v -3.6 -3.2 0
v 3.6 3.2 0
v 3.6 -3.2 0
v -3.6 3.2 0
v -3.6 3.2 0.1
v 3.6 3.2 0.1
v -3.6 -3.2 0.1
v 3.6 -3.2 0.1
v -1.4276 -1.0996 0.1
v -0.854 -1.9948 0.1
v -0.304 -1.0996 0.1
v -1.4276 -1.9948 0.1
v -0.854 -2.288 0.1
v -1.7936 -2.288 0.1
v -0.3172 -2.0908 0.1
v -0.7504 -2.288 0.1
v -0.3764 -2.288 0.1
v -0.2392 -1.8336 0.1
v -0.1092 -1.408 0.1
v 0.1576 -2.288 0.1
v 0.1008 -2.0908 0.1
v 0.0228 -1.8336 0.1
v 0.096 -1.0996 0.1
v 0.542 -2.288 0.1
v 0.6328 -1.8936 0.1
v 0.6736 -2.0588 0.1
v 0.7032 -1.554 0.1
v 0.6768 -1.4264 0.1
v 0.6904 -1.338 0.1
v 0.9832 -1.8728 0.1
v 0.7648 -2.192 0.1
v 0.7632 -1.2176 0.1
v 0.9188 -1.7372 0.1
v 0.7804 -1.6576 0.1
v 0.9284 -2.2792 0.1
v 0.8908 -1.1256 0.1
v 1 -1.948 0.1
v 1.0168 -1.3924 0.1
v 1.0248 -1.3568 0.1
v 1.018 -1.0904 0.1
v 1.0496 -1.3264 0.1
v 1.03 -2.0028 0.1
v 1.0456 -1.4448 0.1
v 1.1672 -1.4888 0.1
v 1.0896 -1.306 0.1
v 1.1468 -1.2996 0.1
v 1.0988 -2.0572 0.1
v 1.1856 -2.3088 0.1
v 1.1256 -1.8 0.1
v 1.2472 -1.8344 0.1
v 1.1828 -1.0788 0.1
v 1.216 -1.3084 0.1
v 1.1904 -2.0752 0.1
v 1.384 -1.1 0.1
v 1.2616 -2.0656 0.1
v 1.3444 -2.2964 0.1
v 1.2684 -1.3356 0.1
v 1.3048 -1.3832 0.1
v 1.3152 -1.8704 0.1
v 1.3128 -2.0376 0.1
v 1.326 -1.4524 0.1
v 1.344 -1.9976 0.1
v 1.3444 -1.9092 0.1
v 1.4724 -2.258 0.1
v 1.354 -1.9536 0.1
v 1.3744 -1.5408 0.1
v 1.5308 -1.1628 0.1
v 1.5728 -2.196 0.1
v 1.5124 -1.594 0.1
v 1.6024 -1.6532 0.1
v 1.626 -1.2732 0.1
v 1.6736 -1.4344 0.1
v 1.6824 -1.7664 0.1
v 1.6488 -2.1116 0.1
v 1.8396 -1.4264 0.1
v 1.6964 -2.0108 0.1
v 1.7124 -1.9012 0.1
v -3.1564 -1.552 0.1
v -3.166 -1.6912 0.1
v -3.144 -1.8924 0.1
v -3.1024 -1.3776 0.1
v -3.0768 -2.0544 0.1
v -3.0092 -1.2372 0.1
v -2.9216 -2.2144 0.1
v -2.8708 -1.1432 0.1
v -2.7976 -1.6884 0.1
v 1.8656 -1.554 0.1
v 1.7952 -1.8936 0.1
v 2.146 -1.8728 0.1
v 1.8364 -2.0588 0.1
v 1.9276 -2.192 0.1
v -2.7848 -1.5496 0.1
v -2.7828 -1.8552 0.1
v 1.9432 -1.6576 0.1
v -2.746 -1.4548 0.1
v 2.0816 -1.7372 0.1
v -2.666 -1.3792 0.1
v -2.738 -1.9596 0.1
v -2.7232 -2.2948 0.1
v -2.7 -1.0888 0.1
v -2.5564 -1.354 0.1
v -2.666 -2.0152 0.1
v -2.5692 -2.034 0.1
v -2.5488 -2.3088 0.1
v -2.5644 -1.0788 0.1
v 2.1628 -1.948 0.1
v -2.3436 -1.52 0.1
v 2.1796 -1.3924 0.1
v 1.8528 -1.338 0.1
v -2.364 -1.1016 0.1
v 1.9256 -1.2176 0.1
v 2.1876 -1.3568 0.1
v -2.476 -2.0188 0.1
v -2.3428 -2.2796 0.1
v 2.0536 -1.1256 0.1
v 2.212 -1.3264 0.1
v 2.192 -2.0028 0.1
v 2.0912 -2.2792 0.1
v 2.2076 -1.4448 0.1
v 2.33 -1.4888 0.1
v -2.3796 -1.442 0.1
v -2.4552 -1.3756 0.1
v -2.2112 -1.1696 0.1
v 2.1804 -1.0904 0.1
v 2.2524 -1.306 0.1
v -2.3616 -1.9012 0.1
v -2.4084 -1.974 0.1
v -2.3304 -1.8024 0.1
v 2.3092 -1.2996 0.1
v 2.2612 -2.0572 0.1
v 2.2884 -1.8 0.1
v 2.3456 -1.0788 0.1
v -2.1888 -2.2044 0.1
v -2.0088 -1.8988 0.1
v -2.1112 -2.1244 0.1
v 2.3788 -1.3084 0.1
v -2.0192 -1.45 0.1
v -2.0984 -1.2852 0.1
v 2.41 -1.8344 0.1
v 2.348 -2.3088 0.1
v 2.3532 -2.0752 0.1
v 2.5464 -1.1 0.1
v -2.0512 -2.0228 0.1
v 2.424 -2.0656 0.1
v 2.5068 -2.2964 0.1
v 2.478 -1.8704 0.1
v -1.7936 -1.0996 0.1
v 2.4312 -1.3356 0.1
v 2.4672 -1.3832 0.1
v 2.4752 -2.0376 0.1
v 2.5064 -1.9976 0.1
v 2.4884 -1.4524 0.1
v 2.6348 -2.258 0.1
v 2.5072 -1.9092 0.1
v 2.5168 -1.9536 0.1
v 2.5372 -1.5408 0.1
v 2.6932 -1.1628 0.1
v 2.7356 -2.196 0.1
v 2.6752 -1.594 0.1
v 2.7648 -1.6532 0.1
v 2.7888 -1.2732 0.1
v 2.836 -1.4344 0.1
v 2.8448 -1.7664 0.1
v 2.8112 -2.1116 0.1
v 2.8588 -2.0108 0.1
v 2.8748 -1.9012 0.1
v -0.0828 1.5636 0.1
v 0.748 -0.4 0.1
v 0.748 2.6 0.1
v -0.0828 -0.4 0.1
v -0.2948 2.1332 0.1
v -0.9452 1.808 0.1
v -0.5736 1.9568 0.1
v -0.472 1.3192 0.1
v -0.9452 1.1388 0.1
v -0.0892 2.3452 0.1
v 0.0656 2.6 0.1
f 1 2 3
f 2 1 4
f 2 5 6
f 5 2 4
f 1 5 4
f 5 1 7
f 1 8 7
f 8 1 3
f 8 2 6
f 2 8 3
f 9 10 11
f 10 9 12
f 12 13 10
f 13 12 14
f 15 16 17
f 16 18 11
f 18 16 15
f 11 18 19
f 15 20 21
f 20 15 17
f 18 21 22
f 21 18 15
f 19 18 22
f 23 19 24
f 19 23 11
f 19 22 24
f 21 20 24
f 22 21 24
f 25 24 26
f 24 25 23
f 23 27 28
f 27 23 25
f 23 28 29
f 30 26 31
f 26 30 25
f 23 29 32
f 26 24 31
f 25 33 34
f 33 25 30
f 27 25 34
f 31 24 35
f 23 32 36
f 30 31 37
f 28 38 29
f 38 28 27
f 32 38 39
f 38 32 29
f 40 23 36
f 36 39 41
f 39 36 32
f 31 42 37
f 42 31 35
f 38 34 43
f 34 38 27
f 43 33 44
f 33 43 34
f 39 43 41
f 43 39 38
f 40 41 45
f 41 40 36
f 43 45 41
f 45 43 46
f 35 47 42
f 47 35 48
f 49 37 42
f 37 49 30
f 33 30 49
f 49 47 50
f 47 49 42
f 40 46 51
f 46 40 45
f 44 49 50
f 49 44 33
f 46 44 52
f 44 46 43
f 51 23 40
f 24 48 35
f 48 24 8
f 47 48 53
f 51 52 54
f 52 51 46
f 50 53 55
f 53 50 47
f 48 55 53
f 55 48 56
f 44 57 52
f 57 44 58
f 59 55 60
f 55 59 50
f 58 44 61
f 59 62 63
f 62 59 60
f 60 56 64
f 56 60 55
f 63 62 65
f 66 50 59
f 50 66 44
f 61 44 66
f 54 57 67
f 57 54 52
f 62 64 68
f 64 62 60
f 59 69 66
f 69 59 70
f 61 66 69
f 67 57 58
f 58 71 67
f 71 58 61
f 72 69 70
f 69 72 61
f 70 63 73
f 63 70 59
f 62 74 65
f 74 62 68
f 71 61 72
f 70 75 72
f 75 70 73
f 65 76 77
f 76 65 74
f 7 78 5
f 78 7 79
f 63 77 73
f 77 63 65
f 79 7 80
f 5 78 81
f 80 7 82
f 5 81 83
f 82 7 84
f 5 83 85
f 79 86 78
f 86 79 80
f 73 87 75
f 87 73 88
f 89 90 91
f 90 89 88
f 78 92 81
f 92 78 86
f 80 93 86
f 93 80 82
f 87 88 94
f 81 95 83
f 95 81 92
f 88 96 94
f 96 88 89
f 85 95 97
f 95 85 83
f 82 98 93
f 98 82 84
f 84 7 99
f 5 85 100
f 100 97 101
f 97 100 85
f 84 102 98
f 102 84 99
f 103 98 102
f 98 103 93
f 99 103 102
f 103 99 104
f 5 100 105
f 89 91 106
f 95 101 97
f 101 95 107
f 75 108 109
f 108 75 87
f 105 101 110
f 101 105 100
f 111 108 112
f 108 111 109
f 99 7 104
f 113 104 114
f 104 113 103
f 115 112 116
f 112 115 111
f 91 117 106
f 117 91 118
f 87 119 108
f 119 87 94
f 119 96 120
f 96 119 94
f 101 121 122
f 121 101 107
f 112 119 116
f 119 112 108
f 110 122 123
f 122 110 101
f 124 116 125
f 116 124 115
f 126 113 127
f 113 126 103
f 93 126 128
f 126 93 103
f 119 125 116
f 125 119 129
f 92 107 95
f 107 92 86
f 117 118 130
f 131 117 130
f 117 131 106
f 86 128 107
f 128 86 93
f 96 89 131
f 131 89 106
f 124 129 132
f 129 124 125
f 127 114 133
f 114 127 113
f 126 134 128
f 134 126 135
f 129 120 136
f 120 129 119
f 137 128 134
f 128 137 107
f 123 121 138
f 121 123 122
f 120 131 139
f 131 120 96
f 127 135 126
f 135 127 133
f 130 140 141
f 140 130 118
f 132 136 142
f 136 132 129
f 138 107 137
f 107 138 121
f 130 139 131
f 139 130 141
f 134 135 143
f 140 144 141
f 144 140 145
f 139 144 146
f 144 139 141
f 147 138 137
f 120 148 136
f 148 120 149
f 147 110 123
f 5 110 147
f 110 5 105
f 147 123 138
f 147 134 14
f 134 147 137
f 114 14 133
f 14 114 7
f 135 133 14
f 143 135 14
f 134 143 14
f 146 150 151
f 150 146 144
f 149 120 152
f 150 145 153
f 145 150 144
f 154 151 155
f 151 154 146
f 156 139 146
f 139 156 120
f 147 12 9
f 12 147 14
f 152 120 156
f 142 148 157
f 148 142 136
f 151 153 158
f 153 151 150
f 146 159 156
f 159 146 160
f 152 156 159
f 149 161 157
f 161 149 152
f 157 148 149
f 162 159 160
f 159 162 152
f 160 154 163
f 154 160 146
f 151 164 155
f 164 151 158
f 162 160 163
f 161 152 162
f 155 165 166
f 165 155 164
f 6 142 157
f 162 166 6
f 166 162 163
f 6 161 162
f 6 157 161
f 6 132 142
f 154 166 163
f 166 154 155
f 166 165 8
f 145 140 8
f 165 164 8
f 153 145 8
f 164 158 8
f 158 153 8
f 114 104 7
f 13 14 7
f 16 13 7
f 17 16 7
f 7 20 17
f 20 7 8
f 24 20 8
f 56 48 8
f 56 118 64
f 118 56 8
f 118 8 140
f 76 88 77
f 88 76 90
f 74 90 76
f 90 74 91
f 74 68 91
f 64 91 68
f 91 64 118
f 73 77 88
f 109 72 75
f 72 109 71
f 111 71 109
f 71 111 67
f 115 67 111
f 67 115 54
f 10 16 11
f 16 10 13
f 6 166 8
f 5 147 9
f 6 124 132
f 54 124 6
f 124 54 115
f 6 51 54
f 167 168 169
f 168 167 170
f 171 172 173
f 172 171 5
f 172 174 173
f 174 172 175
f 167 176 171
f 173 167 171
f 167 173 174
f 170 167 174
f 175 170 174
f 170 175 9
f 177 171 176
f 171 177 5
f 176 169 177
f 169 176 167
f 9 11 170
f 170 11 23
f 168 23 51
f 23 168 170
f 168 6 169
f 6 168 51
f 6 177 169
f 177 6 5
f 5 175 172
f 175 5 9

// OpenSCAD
// file: ../p/box5-12.scad
use <../lib.scad>
function ldraw_lib__box5_12() = [
// 0 Box with 5 Faces without Any Edges
// 0 Name: box5-12.dat
// 0 Author: Chris Dee [cwdee]
// 0 !LDRAW_ORG Primitive UPDATE 2009-02
// 0 !LICENSE Licensed under CC BY 4.0 : see CAreadme.txt
// 
// 0 BFC CERTIFY CCW
  [0,"BFC","CERTIFY"],
  [0,"BFC","CCW"],
// 
// 0 !HISTORY 2009-09-03 [PTadmin] Official Update 2009-02
// 
// 
// 4 16 1 1 1 1 1 -1 -1 1 -1 -1 1 1
  [4,16,1,1,1,1,1,-1,-1,1,-1,-1,1,1],
// 4 16 -1 0 1 1 0 1 1 1 1 -1 1 1
  [4,16,-1,0,1,1,0,1,1,1,1,-1,1,1],
// 4 16 -1 0 -1 -1 0 1 -1 1 1 -1 1 -1
  [4,16,-1,0,-1,-1,0,1,-1,1,1,-1,1,-1],
// 4 16 1 0 -1 -1 0 -1 -1 1 -1 1 1 -1
  [4,16,1,0,-1,-1,0,-1,-1,1,-1,1,1,-1],
// 4 16 1 0 1 1 0 -1 1 1 -1 1 1 1
  [4,16,1,0,1,1,0,-1,1,1,-1,1,1,1],
// 0
];
module ldraw_lib__box5_12(step=0, col=false, unit=2/5, alt=false, line=0.2, solid=!$preview)
    makepoly(ldraw_lib__box5_12(), step=step, col=col, unit=unit, alt=alt, line=line, solid=solid);
ldraw_lib__box5_12(line=0.2);
// main file
use <../lib.scad>
use <s/4296207gs01.scad>
function ldraw_lib__4296207g() = [
// 0 Sticker 0.8 x  0.9 with White "1 CLASS"
// 0 Name: 4296207g.dat
// 0 Author: Gerald Lasser [GeraldLasser]
// 0 !LDRAW_ORG Part UPDATE 2024-03
// 0 !LICENSE Licensed under CC BY 4.0 : see CAreadme.txt
// 
// 0 BFC CERTIFY CCW
  [0,"BFC","CERTIFY"],
  [0,"BFC","CCW"],
// 
// 0 !KEYWORDS Font Impact, Set 7897
// 
// 0 !HISTORY 2024-04-28 [OrionP] Official Update 2024-03
// 
// 
// 1 16 0 0 0 1 0 0 0 1 0 0 0 1 s\4296207gs01.dat
  [1,16,0,0,0,1,0,0,0,1,0,0,0,1, ldraw_lib__s__4296207gs01()],
// 
// 4 15 -.207 -.25 3.909 -.207 -.25 -1 1.87 -.25 -1 1.87 -.25 6.5
  [4,15,-.207,-.25,3.909,-.207,-.25,-1,1.87,-.25,-1,1.87,-.25,6.5],
// 4 16 -.737 -.25 5.333 -9 -.25 8 -2.363 -.25 4.52 -1.434 -.25 4.892
  [4,16,-.737,-.25,5.333,-9,-.25,8,-2.363,-.25,4.52,-1.434,-.25,4.892],
// 4 15 -1.434 -.25 4.892 -2.363 -.25 4.52 -2.363 -.25 2.847 -1.18 -.25 3.298
  [4,15,-1.434,-.25,4.892,-2.363,-.25,4.52,-2.363,-.25,2.847,-1.18,-.25,3.298],
// 3 15 -.207 -.25 3.909 -.223 -.25 5.863 -.737 -.25 5.333
  [3,15,-.207,-.25,3.909,-.223,-.25,5.863,-.737,-.25,5.333],
// 4 15 -1.18 -.25 3.298 -.207 -.25 3.909 -.737 -.25 5.333 -1.434 -.25 4.892
  [4,15,-1.18,-.25,3.298,-.207,-.25,3.909,-.737,-.25,5.333,-1.434,-.25,4.892],
// 3 16 -.207 -.25 -1 -.207 -.25 3.909 -1.18 -.25 3.298
  [3,16,-.207,-.25,-1,-.207,-.25,3.909,-1.18,-.25,3.298],
// 4 16 -1.18 -.25 3.298 -2.363 -.25 2.847 -3.569 -.25 -2.749 -.207 -.25 -1
  [4,16,-1.18,-.25,3.298,-2.363,-.25,2.847,-3.569,-.25,-2.749,-.207,-.25,-1],
// 4 16 -.737 -.25 5.333 -.223 -.25 5.863 .164 -.25 6.5 -9 -.25 8
  [4,16,-.737,-.25,5.333,-.223,-.25,5.863,.164,-.25,6.5,-9,-.25,8],
// 4 15 -.207 -.25 3.909 1.87 -.25 6.5 .164 -.25 6.5 -.223 -.25 5.863
  [4,15,-.207,-.25,3.909,1.87,-.25,6.5,.164,-.25,6.5,-.223,-.25,5.863],
// 3 16 -3.569 -.25 -2.749 -.76 -.25 -2.749 -.207 -.25 -1
  [3,16,-3.569,-.25,-2.749,-.76,-.25,-2.749,-.207,-.25,-1],
// 3 16 -.207 -.25 -1 -.76 -.25 -2.749 .24 -.25 -2.749
  [3,16,-.207,-.25,-1,-.76,-.25,-2.749,.24,-.25,-2.749],
// 4 16 -.207 -.25 -1 .24 -.25 -2.749 2.957 -.25 -2.697 1.87 -.25 -1
  [4,16,-.207,-.25,-1,.24,-.25,-2.749,2.957,-.25,-2.697,1.87,-.25,-1],
// 4 16 1.87 -.25 6.5 1.87 -.25 -1 2.957 -.25 -2.697 9 -.25 8
  [4,16,1.87,-.25,6.5,1.87,-.25,-1,2.957,-.25,-2.697,9,-.25,8],
// 4 16 1.87 -.25 6.5 9 -.25 8 -9 -.25 8 .164 -.25 6.5
  [4,16,1.87,-.25,6.5,9,-.25,8,-9,-.25,8,.164,-.25,6.5],
// 4 16 -2.363 -.25 4.52 -9 -.25 8 -3.569 -.25 -2.749 -2.363 -.25 2.847
  [4,16,-2.363,-.25,4.52,-9,-.25,8,-3.569,-.25,-2.749,-2.363,-.25,2.847],
];
module ldraw_lib__4296207g(step=0, col=false, unit=2/5, alt=false, line=0.2, solid=!$preview)
    makepoly(ldraw_lib__4296207g(), step=step, col=col, unit=unit, alt=alt, line=line, solid=solid);
ldraw_lib__4296207g(line=0.2);
